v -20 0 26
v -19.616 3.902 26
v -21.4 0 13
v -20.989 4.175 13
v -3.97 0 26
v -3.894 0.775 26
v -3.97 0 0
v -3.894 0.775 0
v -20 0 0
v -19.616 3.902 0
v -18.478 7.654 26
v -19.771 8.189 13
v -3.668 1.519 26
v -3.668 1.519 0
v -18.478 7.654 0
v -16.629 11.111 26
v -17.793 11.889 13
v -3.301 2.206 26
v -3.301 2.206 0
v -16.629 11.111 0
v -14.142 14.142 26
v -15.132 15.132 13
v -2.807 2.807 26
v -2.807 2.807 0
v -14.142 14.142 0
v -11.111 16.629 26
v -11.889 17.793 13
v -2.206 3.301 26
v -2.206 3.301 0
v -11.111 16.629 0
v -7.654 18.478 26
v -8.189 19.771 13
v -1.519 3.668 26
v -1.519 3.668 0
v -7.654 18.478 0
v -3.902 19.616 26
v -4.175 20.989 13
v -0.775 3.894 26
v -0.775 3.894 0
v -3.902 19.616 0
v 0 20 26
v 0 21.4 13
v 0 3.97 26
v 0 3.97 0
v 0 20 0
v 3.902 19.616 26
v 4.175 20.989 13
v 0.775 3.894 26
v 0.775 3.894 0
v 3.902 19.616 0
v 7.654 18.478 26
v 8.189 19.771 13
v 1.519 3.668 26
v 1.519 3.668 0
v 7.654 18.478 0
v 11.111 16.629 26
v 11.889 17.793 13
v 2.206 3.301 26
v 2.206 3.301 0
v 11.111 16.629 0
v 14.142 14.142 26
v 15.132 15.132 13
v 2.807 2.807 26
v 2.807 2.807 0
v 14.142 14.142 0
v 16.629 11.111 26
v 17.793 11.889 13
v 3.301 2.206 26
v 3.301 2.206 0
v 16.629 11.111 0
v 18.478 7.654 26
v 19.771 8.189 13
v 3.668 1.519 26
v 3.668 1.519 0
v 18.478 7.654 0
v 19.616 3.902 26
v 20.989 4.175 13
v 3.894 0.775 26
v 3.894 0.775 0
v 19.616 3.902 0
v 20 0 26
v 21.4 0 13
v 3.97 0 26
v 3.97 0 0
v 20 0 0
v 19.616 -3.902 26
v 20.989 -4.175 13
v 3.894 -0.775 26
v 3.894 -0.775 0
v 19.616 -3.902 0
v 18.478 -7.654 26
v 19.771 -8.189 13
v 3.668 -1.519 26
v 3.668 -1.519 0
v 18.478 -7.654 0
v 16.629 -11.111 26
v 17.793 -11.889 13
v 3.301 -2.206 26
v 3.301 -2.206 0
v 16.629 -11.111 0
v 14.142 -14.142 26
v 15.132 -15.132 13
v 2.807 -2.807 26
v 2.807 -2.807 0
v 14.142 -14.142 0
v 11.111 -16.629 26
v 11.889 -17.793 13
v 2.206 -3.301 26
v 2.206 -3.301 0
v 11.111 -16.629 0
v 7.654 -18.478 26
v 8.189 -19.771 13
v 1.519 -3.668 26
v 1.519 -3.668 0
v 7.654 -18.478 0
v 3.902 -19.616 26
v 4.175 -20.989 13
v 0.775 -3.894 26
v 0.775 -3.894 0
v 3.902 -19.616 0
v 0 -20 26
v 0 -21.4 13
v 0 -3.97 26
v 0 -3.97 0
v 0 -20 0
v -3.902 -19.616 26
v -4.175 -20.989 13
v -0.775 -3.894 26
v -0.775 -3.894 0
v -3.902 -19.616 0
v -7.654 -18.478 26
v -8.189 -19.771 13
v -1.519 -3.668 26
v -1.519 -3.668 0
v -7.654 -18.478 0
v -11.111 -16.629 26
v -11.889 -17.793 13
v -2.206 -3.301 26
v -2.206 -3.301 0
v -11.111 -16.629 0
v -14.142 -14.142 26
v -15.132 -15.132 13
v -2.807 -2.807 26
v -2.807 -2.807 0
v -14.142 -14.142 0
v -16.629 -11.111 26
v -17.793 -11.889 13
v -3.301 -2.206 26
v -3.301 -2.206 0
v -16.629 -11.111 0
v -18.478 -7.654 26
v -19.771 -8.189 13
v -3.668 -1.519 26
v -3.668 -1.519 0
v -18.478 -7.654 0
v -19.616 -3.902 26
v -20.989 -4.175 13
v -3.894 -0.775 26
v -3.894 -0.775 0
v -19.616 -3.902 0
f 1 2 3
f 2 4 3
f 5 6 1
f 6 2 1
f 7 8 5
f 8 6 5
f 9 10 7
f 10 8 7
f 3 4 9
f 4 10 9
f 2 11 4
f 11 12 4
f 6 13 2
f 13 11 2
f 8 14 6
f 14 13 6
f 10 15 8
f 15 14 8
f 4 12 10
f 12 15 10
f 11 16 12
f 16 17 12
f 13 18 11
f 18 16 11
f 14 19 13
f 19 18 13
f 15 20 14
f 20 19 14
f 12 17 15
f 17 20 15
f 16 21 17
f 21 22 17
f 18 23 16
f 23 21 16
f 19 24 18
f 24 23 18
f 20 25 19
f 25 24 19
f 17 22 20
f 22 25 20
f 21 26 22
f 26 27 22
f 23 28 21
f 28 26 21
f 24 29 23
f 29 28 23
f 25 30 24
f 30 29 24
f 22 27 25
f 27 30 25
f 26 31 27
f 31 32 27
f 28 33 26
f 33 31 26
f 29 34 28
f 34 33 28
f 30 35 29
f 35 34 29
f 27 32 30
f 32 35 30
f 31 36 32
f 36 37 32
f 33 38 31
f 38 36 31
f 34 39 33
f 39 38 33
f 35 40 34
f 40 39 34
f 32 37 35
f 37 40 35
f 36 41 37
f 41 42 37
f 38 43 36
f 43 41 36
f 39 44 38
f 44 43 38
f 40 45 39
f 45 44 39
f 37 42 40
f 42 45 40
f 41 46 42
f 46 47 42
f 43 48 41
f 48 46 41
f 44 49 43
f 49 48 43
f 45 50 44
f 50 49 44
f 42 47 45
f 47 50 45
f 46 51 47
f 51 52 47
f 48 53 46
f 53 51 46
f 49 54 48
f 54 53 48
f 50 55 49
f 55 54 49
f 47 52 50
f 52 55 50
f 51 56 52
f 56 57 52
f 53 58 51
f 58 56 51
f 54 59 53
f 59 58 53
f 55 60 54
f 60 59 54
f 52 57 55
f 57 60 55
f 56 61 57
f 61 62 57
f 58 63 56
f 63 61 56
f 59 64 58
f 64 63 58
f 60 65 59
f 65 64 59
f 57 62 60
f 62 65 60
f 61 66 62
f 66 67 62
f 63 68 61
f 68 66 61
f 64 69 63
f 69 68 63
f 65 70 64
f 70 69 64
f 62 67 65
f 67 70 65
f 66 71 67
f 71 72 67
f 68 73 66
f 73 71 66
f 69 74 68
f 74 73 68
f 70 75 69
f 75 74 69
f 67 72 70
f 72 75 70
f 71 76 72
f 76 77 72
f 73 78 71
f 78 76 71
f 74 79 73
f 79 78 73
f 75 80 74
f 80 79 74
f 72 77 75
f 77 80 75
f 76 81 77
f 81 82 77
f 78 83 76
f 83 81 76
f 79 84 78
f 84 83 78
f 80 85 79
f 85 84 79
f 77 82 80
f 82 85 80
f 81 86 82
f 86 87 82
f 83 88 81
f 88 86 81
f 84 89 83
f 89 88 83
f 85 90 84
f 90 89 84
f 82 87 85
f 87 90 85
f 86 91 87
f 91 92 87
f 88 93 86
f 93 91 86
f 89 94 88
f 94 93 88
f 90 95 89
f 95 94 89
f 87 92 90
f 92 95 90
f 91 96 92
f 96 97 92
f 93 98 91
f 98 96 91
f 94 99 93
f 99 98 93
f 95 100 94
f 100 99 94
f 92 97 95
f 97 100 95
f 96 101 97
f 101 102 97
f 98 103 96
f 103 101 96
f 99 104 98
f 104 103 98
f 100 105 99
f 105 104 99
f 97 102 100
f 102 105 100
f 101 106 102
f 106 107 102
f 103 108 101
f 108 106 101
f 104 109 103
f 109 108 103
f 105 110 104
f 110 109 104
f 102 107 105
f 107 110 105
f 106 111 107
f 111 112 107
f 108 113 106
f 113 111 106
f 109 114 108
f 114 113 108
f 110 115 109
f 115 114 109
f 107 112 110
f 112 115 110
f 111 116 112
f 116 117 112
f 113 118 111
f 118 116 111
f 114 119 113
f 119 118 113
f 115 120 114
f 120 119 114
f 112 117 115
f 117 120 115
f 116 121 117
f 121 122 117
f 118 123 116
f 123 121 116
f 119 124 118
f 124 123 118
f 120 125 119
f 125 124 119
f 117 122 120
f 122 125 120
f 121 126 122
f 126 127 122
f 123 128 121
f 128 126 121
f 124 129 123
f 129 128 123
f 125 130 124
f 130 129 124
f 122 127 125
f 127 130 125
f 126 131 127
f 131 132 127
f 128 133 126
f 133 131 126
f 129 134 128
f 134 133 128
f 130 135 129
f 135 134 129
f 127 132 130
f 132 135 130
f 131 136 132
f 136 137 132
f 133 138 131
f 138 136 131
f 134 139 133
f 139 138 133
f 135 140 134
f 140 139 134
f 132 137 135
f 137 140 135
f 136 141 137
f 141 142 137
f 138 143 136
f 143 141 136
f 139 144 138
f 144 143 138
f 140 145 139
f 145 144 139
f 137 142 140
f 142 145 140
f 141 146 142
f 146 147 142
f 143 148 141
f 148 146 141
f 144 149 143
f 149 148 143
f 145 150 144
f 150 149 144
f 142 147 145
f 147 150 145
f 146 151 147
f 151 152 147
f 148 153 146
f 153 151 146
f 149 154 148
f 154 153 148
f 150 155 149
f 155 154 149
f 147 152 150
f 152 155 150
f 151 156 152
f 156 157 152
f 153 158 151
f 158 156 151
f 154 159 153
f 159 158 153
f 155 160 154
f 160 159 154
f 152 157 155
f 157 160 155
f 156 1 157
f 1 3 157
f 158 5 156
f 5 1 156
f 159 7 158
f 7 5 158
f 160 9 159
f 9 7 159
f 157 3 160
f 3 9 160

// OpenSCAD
$fn = 32;

// ----------------------------------------------------------------------
// Belt roller: 40 mm barrel, 26 mm wide, bore 7.94 mm
// ----------------------------------------------------------------------

// --- parameters (mm) ---
bore_d = 7.94;            // bore
barrel_d = 40;            // barrel diameter
roller_w = 26;            // roller width
crown = 1.4;              // crown height at mid width

roller_profile = [[3.97, 0], [20, 0], [21.4, 13], [20, 26], [3.97, 26]];

/* the profile stays clear of the axis, so the bore comes out of the revolve */
rotate_extrude() polygon(roller_profile);
